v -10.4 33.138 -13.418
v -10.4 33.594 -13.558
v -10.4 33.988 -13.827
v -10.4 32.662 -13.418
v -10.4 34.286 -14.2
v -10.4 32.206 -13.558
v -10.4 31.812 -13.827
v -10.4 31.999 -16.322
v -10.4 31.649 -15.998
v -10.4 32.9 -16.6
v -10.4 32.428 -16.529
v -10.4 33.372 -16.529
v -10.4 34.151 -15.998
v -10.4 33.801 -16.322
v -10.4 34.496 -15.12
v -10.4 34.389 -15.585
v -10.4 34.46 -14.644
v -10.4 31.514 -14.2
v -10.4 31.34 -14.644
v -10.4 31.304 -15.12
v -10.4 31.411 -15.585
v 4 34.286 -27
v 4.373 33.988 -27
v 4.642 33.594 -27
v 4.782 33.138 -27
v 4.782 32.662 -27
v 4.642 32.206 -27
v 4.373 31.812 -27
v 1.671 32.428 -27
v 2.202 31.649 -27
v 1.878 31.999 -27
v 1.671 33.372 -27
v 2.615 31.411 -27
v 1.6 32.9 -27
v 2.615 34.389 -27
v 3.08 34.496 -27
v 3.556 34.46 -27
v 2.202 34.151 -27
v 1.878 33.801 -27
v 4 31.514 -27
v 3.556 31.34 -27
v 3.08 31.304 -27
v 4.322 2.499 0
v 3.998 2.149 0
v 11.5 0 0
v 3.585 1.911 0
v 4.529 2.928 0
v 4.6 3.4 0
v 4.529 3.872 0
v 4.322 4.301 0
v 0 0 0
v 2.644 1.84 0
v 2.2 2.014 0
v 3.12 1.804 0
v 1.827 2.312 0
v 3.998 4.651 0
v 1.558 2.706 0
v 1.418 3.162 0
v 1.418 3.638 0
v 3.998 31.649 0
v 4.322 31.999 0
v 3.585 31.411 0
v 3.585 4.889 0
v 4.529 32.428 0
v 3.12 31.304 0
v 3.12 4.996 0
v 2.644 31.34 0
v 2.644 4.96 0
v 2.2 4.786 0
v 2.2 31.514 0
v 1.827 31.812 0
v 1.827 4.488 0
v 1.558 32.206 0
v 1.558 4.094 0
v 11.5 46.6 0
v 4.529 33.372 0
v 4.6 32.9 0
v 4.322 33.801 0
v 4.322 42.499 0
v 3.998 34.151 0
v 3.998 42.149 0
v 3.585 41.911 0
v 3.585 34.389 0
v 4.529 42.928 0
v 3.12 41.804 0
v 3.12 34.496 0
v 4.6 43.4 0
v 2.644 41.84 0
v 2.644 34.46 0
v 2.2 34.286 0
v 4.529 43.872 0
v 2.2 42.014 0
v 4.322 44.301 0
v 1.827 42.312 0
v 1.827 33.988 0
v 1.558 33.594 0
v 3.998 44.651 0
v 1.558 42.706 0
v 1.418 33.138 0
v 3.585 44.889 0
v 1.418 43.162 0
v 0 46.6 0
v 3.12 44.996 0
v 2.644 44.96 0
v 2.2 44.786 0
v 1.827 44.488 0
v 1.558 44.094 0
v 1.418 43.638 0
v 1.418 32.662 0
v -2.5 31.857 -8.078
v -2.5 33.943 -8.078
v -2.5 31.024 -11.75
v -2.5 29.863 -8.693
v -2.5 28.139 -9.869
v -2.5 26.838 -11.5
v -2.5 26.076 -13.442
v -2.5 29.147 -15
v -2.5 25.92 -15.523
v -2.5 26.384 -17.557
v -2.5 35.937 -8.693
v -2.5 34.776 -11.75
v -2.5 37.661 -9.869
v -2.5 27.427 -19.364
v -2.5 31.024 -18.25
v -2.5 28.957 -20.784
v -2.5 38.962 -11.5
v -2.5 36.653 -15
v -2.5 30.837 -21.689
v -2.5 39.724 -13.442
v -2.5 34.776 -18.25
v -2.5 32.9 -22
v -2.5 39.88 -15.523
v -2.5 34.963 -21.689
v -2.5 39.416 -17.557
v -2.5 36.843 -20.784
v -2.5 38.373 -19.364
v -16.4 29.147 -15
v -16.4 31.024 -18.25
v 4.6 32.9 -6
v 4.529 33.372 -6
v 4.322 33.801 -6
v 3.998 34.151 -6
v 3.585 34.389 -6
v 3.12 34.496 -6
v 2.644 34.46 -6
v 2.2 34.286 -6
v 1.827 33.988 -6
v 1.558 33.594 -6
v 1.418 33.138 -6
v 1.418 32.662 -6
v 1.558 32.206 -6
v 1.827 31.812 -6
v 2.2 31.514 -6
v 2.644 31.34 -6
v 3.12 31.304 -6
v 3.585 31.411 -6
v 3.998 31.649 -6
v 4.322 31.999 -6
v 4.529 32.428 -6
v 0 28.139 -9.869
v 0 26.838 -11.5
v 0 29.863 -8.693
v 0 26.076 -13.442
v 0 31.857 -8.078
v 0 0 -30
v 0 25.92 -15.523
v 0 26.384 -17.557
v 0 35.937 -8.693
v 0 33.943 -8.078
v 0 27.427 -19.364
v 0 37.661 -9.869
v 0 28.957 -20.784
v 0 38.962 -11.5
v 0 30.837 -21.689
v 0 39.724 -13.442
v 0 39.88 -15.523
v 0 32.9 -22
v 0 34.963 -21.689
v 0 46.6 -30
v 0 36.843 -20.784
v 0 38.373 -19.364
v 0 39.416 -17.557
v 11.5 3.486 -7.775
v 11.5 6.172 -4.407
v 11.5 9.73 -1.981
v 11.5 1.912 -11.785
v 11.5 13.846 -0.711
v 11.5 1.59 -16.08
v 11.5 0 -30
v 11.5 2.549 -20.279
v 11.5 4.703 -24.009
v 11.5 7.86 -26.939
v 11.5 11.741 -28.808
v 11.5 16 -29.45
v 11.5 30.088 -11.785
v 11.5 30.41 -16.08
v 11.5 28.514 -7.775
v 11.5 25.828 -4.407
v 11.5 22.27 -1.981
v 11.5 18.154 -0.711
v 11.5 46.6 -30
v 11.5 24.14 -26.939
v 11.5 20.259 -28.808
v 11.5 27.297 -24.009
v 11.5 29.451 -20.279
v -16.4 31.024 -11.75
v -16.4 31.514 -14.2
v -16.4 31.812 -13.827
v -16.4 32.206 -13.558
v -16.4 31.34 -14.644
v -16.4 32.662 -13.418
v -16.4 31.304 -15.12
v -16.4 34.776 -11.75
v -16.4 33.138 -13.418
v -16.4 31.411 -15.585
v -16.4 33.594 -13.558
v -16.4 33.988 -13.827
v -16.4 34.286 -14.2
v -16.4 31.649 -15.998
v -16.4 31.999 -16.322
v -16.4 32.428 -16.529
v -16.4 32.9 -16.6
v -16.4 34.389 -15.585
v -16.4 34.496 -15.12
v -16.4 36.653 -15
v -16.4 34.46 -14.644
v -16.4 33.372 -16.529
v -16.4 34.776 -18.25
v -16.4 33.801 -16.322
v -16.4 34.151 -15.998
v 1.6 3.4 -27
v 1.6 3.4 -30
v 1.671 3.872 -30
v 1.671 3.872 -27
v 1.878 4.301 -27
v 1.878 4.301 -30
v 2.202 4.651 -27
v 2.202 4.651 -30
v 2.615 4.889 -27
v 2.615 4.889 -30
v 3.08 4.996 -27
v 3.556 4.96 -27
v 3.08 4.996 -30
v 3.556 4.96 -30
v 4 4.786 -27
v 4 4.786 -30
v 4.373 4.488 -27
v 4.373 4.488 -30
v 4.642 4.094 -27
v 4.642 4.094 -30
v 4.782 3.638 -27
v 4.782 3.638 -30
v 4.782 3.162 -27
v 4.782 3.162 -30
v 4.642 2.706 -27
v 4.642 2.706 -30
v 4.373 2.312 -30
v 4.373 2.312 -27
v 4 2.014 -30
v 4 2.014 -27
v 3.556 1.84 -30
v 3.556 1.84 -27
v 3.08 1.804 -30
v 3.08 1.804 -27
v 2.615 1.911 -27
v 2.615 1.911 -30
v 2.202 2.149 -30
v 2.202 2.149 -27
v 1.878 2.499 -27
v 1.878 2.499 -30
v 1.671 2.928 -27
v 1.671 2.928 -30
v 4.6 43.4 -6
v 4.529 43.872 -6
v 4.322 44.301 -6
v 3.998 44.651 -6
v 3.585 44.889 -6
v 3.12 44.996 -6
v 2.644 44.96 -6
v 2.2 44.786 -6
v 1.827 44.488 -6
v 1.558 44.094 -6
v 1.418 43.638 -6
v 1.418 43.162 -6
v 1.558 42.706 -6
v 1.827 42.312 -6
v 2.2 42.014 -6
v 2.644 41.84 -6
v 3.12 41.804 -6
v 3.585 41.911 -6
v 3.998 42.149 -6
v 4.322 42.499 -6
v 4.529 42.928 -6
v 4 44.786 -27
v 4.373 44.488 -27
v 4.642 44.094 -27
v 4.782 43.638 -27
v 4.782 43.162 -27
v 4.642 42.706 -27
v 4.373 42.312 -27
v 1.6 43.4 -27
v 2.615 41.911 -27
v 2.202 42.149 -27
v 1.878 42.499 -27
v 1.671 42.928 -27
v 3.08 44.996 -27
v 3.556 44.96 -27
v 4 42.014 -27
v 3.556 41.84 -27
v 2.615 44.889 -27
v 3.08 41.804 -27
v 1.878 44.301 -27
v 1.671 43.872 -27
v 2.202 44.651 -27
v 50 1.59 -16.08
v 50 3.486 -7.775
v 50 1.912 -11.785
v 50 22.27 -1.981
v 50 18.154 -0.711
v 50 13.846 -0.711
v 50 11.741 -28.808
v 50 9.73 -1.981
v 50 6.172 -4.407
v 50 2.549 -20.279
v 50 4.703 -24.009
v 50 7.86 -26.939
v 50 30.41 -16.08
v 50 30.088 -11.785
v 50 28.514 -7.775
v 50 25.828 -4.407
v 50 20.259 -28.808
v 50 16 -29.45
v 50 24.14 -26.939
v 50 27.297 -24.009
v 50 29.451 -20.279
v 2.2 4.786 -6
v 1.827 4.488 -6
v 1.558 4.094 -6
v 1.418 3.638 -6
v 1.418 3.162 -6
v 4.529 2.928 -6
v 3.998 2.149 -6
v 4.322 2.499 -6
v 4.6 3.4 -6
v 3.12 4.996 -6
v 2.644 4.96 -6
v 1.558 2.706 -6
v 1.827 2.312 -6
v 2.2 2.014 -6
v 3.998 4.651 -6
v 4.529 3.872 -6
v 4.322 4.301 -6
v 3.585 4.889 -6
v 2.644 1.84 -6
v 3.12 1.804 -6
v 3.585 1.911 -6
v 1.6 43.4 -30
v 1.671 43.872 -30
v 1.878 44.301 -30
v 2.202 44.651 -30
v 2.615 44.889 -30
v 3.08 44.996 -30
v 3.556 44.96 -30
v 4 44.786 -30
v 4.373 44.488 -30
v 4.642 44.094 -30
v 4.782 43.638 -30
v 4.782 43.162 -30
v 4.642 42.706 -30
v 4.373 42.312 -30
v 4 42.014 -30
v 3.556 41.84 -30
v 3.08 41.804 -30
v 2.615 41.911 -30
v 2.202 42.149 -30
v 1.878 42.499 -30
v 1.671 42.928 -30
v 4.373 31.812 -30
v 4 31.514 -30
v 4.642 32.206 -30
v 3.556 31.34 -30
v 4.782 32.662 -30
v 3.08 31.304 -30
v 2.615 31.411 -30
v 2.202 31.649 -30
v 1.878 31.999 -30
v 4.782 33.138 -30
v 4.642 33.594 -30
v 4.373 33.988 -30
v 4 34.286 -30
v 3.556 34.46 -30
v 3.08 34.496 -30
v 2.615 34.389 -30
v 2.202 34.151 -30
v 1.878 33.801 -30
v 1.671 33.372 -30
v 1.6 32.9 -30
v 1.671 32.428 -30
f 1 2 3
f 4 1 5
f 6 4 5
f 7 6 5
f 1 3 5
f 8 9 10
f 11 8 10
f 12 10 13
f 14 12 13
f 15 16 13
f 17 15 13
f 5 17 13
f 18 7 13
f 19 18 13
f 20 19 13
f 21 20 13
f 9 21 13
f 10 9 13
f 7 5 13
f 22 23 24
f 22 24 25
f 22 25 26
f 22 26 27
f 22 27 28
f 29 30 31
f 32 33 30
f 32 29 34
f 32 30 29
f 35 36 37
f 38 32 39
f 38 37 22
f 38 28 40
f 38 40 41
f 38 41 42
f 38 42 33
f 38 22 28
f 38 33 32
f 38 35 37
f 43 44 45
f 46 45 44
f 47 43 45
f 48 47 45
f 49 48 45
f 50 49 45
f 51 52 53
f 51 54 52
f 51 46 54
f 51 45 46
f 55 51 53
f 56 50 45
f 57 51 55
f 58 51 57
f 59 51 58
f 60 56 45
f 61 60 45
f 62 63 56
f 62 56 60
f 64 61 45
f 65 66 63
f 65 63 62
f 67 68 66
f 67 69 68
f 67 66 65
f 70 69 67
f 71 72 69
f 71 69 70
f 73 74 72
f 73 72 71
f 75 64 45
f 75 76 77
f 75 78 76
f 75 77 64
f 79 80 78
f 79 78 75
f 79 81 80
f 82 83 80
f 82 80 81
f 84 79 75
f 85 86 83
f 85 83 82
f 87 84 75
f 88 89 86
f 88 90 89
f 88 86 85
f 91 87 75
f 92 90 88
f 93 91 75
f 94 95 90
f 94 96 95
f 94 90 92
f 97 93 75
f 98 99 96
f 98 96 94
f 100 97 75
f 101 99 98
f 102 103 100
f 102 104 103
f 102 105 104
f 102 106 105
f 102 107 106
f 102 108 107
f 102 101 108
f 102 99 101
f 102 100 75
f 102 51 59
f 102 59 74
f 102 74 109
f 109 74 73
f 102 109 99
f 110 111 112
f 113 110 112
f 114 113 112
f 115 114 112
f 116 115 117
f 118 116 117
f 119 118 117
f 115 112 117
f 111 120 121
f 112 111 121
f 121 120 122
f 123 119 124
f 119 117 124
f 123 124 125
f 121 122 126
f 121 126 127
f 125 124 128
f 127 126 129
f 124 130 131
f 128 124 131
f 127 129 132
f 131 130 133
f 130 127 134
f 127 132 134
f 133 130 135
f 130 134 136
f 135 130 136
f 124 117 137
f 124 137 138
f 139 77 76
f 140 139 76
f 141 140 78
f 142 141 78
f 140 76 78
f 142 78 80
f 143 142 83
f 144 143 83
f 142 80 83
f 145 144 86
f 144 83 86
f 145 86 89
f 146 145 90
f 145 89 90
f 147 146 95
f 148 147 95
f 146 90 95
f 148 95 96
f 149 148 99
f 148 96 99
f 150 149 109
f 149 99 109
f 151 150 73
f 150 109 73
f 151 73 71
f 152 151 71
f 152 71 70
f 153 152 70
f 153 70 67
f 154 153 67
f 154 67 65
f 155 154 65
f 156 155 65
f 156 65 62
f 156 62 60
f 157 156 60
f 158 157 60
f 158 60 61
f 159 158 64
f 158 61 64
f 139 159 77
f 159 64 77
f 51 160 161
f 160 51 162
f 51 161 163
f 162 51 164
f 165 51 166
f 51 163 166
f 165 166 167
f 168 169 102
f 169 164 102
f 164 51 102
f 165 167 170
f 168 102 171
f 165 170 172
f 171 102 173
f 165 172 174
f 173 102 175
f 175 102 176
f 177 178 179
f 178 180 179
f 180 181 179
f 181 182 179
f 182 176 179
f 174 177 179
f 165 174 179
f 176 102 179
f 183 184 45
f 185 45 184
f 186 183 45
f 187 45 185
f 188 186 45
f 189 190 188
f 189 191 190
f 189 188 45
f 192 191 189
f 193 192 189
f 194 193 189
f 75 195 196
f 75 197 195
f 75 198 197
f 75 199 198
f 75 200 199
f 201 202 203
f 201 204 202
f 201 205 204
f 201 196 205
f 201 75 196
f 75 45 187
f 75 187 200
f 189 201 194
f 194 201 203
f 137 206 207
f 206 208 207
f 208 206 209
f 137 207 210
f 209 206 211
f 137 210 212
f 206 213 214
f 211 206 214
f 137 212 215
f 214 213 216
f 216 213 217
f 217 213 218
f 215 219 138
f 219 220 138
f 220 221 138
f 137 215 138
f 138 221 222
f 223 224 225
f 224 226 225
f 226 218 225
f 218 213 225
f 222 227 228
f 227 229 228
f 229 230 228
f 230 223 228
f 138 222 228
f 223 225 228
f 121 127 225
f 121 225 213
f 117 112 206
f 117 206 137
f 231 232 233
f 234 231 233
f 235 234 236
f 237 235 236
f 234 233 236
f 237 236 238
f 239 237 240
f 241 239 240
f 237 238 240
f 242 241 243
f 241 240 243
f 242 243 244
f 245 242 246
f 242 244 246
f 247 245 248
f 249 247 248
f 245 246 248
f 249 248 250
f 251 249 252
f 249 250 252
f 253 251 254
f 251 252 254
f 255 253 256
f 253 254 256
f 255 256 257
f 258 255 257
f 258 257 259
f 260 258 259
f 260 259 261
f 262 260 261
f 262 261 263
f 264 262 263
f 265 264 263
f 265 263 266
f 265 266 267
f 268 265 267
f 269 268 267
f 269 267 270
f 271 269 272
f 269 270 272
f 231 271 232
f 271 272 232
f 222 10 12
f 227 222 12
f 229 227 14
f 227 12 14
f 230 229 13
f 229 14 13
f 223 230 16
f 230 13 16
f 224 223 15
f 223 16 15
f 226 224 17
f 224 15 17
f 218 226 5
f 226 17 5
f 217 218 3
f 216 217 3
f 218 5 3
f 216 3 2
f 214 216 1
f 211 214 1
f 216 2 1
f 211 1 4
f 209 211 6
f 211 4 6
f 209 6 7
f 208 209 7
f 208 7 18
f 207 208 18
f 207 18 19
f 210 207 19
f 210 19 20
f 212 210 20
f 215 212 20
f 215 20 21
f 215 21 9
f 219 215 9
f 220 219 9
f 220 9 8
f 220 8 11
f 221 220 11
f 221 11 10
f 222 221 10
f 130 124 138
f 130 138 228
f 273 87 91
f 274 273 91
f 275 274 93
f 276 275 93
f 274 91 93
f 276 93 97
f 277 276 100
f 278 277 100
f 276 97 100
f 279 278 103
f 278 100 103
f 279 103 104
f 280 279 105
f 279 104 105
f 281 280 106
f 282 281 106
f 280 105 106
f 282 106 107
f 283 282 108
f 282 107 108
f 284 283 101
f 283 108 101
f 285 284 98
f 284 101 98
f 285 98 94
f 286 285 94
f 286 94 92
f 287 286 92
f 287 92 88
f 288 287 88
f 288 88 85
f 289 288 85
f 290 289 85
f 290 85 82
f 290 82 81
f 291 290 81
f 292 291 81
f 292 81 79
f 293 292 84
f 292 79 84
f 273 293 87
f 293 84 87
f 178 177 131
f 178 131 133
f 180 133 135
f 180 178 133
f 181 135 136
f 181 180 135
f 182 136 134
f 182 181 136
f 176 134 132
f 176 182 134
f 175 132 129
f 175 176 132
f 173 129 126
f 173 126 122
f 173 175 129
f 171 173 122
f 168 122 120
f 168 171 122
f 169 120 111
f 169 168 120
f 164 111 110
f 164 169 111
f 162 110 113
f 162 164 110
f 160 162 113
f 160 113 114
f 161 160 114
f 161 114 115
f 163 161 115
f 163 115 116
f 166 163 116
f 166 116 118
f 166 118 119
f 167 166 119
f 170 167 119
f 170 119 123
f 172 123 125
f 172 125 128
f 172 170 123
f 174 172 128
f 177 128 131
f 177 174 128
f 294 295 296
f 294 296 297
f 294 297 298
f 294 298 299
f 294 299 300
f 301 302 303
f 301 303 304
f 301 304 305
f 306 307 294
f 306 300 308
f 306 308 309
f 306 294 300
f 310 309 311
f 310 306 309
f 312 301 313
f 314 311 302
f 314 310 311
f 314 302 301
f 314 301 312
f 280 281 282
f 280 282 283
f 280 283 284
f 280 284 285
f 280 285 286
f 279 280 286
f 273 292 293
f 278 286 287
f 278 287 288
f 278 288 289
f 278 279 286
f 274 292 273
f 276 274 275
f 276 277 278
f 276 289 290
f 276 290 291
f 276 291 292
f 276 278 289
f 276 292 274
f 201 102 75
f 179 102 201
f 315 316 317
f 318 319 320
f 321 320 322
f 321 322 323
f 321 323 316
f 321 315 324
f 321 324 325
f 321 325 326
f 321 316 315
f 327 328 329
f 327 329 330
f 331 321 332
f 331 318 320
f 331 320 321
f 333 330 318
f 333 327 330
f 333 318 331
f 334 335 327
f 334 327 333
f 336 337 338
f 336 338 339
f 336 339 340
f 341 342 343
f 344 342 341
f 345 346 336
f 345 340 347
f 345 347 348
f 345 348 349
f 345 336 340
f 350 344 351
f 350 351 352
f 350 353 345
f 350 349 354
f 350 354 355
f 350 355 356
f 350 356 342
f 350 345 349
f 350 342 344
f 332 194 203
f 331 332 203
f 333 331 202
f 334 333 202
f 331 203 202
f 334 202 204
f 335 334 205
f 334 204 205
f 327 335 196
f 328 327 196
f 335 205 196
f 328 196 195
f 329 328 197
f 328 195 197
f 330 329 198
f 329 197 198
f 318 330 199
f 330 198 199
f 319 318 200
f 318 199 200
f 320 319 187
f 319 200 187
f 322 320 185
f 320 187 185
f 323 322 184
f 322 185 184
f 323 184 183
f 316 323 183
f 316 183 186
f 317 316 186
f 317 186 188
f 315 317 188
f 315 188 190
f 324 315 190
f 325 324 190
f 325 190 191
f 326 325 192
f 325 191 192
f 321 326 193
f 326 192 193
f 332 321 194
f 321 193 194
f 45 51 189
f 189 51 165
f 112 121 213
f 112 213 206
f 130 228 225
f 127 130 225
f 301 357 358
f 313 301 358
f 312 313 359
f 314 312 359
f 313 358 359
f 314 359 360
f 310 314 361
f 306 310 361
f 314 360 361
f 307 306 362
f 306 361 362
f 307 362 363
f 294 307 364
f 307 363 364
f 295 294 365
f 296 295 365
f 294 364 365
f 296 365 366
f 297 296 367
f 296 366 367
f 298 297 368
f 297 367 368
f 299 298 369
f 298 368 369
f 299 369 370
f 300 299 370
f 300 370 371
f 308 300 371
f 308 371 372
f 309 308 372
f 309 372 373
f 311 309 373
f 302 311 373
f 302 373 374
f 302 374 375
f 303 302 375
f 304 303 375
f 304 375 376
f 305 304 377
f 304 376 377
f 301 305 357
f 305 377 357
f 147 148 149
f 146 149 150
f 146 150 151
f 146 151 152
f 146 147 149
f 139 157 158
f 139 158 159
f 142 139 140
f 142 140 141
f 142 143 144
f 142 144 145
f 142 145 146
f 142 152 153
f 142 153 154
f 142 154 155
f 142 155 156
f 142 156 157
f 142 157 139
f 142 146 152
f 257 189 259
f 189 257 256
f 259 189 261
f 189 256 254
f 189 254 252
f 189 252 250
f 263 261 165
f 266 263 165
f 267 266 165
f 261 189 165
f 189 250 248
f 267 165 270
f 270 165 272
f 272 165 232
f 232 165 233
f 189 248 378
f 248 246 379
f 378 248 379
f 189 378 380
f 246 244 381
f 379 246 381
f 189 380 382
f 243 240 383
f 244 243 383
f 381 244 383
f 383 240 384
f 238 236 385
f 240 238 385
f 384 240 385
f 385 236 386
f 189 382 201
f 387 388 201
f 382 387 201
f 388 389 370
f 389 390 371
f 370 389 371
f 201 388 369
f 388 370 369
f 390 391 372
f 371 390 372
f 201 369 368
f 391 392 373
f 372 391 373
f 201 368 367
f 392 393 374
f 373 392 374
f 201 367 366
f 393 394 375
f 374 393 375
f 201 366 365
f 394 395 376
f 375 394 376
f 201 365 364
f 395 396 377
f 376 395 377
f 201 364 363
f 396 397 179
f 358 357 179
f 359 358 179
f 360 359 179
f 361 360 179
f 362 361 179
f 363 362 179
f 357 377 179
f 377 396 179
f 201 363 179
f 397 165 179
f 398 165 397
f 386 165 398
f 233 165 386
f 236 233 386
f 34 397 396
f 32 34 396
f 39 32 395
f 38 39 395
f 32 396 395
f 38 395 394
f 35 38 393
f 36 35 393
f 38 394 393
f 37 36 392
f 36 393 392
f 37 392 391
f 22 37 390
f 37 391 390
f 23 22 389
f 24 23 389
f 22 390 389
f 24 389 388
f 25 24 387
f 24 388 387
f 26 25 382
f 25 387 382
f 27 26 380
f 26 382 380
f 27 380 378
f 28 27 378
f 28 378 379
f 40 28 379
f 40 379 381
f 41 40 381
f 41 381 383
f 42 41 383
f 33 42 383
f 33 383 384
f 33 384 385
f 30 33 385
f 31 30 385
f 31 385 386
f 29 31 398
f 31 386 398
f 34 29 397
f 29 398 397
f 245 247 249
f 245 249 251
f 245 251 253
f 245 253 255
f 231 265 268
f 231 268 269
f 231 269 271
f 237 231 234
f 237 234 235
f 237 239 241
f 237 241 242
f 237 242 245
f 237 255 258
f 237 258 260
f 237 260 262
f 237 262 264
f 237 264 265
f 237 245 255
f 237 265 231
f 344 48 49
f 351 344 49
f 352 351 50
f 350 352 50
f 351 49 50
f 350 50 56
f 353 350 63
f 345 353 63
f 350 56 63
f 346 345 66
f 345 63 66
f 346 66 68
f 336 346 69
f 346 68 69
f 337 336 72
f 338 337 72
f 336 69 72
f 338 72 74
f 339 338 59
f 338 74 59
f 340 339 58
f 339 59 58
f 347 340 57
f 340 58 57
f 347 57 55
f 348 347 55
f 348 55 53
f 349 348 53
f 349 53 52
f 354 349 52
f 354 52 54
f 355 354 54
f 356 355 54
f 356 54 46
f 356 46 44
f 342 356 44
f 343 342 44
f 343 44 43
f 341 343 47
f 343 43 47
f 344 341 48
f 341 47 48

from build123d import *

# Parameters (mm, degrees)
SKETCH_1_W          = 30
SKETCH_1_H          = 46.6
EXTRUDE_1_DEPTH     = 11.5
SKETCH_1_3_R        = 7
EXTRUDE_2_DEPTH     = 2.5
SKETCH_1_4_R        = 1.6
EXTRUDE_3_DEPTH     = 16.4
SKETCH_1_5_R        = 1.6
EXTRUDE_4_DEPTH     = 10.4
SKETCH_2_R          = 14.45
EXTRUDE_5_DEPTH     = 38.5
SKETCH_3_R          = 1.6
CUT_EXTRUDE_1_DEPTH = 6
SKETCH_4_R          = 1.6
CUT_EXTRUDE_2_DEPTH = 3


with BuildPart() as part:
    # 草图1 → 凸台-拉伸1 (new body)
    with BuildSketch(Plane(origin=(0, 0, 0), x_dir=(0, 0, -1), z_dir=(1, 0, 0))):
        with Locations((15, 23.3)):
            Rectangle(SKETCH_1_W, SKETCH_1_H)
    extrude(amount=EXTRUDE_1_DEPTH)

    # 草图1<3> → 凸台-拉伸2 (add)
    with BuildSketch(Plane(origin=(0, 0, 0), x_dir=(0, 0, -1), z_dir=(1, 0, 0))):
        with Locations((15, 32.9)):
            Circle(SKETCH_1_3_R)
        Polygon((15, 36.65277675), (18.25, 34.776388375), (18.25, 31.023611625), (15, 29.14722325), (11.75, 31.023611625), (11.75, 34.776388375), align=None, mode=Mode.SUBTRACT)
    extrude(amount=-EXTRUDE_2_DEPTH)

    # 草图1<4> → 凸台-拉伸3 (add)
    with BuildSketch(Plane(origin=(0, 0, 0), x_dir=(0, 0, -1), z_dir=(1, 0, 0))):
        Polygon((18.25, 31.023611625), (18.25, 34.776388375), (15, 36.65277675), (11.75, 34.776388375), (11.75, 31.023611625), (15, 29.14722325), align=None)
        with Locations((15, 32.9)):
            Circle(SKETCH_1_4_R, mode=Mode.SUBTRACT)
    extrude(amount=-EXTRUDE_3_DEPTH)

    # 草图1<5> → 凸台-拉伸4 (add)
    with BuildSketch(Plane(origin=(0, 0, 0), x_dir=(0, 0, -1), z_dir=(1, 0, 0))):
        with Locations((15, 32.9)):
            Circle(SKETCH_1_5_R)
    extrude(amount=-EXTRUDE_4_DEPTH)

    # 草图2 → 凸台-拉伸5 (add)
    with BuildSketch(Plane(origin=(11.5, 0, 0), x_dir=(0, 0, -1), z_dir=(1, 0, 0))):
        with Locations((15, 16)):
            Circle(SKETCH_2_R)
    extrude(amount=EXTRUDE_5_DEPTH)

    # 草图3 → 切除-拉伸1 (cut)
    with BuildSketch(Plane.XY):
        with Locations((3, 43.4)):
            Circle(SKETCH_3_R)
        with Locations((3, 32.9)):
            Circle(SKETCH_3_R)
        with Locations((3, 3.4)):
            Circle(SKETCH_3_R)
    extrude(amount=-CUT_EXTRUDE_1_DEPTH, mode=Mode.SUBTRACT)

    # 草图4 → 切除-拉伸2 (cut)
    with BuildSketch(Plane(origin=(0, 0, -30), x_dir=(-1, 0, 0), z_dir=(0, 0, -1))):
        with Locations((-3.2, 43.4)):
            Circle(SKETCH_4_R)
        with Locations((-3.2, 32.9)):
            Circle(SKETCH_4_R)
        with Locations((-3.2, 3.4)):
            Circle(SKETCH_4_R)
    extrude(amount=-CUT_EXTRUDE_2_DEPTH, mode=Mode.SUBTRACT)


solid = part.part
